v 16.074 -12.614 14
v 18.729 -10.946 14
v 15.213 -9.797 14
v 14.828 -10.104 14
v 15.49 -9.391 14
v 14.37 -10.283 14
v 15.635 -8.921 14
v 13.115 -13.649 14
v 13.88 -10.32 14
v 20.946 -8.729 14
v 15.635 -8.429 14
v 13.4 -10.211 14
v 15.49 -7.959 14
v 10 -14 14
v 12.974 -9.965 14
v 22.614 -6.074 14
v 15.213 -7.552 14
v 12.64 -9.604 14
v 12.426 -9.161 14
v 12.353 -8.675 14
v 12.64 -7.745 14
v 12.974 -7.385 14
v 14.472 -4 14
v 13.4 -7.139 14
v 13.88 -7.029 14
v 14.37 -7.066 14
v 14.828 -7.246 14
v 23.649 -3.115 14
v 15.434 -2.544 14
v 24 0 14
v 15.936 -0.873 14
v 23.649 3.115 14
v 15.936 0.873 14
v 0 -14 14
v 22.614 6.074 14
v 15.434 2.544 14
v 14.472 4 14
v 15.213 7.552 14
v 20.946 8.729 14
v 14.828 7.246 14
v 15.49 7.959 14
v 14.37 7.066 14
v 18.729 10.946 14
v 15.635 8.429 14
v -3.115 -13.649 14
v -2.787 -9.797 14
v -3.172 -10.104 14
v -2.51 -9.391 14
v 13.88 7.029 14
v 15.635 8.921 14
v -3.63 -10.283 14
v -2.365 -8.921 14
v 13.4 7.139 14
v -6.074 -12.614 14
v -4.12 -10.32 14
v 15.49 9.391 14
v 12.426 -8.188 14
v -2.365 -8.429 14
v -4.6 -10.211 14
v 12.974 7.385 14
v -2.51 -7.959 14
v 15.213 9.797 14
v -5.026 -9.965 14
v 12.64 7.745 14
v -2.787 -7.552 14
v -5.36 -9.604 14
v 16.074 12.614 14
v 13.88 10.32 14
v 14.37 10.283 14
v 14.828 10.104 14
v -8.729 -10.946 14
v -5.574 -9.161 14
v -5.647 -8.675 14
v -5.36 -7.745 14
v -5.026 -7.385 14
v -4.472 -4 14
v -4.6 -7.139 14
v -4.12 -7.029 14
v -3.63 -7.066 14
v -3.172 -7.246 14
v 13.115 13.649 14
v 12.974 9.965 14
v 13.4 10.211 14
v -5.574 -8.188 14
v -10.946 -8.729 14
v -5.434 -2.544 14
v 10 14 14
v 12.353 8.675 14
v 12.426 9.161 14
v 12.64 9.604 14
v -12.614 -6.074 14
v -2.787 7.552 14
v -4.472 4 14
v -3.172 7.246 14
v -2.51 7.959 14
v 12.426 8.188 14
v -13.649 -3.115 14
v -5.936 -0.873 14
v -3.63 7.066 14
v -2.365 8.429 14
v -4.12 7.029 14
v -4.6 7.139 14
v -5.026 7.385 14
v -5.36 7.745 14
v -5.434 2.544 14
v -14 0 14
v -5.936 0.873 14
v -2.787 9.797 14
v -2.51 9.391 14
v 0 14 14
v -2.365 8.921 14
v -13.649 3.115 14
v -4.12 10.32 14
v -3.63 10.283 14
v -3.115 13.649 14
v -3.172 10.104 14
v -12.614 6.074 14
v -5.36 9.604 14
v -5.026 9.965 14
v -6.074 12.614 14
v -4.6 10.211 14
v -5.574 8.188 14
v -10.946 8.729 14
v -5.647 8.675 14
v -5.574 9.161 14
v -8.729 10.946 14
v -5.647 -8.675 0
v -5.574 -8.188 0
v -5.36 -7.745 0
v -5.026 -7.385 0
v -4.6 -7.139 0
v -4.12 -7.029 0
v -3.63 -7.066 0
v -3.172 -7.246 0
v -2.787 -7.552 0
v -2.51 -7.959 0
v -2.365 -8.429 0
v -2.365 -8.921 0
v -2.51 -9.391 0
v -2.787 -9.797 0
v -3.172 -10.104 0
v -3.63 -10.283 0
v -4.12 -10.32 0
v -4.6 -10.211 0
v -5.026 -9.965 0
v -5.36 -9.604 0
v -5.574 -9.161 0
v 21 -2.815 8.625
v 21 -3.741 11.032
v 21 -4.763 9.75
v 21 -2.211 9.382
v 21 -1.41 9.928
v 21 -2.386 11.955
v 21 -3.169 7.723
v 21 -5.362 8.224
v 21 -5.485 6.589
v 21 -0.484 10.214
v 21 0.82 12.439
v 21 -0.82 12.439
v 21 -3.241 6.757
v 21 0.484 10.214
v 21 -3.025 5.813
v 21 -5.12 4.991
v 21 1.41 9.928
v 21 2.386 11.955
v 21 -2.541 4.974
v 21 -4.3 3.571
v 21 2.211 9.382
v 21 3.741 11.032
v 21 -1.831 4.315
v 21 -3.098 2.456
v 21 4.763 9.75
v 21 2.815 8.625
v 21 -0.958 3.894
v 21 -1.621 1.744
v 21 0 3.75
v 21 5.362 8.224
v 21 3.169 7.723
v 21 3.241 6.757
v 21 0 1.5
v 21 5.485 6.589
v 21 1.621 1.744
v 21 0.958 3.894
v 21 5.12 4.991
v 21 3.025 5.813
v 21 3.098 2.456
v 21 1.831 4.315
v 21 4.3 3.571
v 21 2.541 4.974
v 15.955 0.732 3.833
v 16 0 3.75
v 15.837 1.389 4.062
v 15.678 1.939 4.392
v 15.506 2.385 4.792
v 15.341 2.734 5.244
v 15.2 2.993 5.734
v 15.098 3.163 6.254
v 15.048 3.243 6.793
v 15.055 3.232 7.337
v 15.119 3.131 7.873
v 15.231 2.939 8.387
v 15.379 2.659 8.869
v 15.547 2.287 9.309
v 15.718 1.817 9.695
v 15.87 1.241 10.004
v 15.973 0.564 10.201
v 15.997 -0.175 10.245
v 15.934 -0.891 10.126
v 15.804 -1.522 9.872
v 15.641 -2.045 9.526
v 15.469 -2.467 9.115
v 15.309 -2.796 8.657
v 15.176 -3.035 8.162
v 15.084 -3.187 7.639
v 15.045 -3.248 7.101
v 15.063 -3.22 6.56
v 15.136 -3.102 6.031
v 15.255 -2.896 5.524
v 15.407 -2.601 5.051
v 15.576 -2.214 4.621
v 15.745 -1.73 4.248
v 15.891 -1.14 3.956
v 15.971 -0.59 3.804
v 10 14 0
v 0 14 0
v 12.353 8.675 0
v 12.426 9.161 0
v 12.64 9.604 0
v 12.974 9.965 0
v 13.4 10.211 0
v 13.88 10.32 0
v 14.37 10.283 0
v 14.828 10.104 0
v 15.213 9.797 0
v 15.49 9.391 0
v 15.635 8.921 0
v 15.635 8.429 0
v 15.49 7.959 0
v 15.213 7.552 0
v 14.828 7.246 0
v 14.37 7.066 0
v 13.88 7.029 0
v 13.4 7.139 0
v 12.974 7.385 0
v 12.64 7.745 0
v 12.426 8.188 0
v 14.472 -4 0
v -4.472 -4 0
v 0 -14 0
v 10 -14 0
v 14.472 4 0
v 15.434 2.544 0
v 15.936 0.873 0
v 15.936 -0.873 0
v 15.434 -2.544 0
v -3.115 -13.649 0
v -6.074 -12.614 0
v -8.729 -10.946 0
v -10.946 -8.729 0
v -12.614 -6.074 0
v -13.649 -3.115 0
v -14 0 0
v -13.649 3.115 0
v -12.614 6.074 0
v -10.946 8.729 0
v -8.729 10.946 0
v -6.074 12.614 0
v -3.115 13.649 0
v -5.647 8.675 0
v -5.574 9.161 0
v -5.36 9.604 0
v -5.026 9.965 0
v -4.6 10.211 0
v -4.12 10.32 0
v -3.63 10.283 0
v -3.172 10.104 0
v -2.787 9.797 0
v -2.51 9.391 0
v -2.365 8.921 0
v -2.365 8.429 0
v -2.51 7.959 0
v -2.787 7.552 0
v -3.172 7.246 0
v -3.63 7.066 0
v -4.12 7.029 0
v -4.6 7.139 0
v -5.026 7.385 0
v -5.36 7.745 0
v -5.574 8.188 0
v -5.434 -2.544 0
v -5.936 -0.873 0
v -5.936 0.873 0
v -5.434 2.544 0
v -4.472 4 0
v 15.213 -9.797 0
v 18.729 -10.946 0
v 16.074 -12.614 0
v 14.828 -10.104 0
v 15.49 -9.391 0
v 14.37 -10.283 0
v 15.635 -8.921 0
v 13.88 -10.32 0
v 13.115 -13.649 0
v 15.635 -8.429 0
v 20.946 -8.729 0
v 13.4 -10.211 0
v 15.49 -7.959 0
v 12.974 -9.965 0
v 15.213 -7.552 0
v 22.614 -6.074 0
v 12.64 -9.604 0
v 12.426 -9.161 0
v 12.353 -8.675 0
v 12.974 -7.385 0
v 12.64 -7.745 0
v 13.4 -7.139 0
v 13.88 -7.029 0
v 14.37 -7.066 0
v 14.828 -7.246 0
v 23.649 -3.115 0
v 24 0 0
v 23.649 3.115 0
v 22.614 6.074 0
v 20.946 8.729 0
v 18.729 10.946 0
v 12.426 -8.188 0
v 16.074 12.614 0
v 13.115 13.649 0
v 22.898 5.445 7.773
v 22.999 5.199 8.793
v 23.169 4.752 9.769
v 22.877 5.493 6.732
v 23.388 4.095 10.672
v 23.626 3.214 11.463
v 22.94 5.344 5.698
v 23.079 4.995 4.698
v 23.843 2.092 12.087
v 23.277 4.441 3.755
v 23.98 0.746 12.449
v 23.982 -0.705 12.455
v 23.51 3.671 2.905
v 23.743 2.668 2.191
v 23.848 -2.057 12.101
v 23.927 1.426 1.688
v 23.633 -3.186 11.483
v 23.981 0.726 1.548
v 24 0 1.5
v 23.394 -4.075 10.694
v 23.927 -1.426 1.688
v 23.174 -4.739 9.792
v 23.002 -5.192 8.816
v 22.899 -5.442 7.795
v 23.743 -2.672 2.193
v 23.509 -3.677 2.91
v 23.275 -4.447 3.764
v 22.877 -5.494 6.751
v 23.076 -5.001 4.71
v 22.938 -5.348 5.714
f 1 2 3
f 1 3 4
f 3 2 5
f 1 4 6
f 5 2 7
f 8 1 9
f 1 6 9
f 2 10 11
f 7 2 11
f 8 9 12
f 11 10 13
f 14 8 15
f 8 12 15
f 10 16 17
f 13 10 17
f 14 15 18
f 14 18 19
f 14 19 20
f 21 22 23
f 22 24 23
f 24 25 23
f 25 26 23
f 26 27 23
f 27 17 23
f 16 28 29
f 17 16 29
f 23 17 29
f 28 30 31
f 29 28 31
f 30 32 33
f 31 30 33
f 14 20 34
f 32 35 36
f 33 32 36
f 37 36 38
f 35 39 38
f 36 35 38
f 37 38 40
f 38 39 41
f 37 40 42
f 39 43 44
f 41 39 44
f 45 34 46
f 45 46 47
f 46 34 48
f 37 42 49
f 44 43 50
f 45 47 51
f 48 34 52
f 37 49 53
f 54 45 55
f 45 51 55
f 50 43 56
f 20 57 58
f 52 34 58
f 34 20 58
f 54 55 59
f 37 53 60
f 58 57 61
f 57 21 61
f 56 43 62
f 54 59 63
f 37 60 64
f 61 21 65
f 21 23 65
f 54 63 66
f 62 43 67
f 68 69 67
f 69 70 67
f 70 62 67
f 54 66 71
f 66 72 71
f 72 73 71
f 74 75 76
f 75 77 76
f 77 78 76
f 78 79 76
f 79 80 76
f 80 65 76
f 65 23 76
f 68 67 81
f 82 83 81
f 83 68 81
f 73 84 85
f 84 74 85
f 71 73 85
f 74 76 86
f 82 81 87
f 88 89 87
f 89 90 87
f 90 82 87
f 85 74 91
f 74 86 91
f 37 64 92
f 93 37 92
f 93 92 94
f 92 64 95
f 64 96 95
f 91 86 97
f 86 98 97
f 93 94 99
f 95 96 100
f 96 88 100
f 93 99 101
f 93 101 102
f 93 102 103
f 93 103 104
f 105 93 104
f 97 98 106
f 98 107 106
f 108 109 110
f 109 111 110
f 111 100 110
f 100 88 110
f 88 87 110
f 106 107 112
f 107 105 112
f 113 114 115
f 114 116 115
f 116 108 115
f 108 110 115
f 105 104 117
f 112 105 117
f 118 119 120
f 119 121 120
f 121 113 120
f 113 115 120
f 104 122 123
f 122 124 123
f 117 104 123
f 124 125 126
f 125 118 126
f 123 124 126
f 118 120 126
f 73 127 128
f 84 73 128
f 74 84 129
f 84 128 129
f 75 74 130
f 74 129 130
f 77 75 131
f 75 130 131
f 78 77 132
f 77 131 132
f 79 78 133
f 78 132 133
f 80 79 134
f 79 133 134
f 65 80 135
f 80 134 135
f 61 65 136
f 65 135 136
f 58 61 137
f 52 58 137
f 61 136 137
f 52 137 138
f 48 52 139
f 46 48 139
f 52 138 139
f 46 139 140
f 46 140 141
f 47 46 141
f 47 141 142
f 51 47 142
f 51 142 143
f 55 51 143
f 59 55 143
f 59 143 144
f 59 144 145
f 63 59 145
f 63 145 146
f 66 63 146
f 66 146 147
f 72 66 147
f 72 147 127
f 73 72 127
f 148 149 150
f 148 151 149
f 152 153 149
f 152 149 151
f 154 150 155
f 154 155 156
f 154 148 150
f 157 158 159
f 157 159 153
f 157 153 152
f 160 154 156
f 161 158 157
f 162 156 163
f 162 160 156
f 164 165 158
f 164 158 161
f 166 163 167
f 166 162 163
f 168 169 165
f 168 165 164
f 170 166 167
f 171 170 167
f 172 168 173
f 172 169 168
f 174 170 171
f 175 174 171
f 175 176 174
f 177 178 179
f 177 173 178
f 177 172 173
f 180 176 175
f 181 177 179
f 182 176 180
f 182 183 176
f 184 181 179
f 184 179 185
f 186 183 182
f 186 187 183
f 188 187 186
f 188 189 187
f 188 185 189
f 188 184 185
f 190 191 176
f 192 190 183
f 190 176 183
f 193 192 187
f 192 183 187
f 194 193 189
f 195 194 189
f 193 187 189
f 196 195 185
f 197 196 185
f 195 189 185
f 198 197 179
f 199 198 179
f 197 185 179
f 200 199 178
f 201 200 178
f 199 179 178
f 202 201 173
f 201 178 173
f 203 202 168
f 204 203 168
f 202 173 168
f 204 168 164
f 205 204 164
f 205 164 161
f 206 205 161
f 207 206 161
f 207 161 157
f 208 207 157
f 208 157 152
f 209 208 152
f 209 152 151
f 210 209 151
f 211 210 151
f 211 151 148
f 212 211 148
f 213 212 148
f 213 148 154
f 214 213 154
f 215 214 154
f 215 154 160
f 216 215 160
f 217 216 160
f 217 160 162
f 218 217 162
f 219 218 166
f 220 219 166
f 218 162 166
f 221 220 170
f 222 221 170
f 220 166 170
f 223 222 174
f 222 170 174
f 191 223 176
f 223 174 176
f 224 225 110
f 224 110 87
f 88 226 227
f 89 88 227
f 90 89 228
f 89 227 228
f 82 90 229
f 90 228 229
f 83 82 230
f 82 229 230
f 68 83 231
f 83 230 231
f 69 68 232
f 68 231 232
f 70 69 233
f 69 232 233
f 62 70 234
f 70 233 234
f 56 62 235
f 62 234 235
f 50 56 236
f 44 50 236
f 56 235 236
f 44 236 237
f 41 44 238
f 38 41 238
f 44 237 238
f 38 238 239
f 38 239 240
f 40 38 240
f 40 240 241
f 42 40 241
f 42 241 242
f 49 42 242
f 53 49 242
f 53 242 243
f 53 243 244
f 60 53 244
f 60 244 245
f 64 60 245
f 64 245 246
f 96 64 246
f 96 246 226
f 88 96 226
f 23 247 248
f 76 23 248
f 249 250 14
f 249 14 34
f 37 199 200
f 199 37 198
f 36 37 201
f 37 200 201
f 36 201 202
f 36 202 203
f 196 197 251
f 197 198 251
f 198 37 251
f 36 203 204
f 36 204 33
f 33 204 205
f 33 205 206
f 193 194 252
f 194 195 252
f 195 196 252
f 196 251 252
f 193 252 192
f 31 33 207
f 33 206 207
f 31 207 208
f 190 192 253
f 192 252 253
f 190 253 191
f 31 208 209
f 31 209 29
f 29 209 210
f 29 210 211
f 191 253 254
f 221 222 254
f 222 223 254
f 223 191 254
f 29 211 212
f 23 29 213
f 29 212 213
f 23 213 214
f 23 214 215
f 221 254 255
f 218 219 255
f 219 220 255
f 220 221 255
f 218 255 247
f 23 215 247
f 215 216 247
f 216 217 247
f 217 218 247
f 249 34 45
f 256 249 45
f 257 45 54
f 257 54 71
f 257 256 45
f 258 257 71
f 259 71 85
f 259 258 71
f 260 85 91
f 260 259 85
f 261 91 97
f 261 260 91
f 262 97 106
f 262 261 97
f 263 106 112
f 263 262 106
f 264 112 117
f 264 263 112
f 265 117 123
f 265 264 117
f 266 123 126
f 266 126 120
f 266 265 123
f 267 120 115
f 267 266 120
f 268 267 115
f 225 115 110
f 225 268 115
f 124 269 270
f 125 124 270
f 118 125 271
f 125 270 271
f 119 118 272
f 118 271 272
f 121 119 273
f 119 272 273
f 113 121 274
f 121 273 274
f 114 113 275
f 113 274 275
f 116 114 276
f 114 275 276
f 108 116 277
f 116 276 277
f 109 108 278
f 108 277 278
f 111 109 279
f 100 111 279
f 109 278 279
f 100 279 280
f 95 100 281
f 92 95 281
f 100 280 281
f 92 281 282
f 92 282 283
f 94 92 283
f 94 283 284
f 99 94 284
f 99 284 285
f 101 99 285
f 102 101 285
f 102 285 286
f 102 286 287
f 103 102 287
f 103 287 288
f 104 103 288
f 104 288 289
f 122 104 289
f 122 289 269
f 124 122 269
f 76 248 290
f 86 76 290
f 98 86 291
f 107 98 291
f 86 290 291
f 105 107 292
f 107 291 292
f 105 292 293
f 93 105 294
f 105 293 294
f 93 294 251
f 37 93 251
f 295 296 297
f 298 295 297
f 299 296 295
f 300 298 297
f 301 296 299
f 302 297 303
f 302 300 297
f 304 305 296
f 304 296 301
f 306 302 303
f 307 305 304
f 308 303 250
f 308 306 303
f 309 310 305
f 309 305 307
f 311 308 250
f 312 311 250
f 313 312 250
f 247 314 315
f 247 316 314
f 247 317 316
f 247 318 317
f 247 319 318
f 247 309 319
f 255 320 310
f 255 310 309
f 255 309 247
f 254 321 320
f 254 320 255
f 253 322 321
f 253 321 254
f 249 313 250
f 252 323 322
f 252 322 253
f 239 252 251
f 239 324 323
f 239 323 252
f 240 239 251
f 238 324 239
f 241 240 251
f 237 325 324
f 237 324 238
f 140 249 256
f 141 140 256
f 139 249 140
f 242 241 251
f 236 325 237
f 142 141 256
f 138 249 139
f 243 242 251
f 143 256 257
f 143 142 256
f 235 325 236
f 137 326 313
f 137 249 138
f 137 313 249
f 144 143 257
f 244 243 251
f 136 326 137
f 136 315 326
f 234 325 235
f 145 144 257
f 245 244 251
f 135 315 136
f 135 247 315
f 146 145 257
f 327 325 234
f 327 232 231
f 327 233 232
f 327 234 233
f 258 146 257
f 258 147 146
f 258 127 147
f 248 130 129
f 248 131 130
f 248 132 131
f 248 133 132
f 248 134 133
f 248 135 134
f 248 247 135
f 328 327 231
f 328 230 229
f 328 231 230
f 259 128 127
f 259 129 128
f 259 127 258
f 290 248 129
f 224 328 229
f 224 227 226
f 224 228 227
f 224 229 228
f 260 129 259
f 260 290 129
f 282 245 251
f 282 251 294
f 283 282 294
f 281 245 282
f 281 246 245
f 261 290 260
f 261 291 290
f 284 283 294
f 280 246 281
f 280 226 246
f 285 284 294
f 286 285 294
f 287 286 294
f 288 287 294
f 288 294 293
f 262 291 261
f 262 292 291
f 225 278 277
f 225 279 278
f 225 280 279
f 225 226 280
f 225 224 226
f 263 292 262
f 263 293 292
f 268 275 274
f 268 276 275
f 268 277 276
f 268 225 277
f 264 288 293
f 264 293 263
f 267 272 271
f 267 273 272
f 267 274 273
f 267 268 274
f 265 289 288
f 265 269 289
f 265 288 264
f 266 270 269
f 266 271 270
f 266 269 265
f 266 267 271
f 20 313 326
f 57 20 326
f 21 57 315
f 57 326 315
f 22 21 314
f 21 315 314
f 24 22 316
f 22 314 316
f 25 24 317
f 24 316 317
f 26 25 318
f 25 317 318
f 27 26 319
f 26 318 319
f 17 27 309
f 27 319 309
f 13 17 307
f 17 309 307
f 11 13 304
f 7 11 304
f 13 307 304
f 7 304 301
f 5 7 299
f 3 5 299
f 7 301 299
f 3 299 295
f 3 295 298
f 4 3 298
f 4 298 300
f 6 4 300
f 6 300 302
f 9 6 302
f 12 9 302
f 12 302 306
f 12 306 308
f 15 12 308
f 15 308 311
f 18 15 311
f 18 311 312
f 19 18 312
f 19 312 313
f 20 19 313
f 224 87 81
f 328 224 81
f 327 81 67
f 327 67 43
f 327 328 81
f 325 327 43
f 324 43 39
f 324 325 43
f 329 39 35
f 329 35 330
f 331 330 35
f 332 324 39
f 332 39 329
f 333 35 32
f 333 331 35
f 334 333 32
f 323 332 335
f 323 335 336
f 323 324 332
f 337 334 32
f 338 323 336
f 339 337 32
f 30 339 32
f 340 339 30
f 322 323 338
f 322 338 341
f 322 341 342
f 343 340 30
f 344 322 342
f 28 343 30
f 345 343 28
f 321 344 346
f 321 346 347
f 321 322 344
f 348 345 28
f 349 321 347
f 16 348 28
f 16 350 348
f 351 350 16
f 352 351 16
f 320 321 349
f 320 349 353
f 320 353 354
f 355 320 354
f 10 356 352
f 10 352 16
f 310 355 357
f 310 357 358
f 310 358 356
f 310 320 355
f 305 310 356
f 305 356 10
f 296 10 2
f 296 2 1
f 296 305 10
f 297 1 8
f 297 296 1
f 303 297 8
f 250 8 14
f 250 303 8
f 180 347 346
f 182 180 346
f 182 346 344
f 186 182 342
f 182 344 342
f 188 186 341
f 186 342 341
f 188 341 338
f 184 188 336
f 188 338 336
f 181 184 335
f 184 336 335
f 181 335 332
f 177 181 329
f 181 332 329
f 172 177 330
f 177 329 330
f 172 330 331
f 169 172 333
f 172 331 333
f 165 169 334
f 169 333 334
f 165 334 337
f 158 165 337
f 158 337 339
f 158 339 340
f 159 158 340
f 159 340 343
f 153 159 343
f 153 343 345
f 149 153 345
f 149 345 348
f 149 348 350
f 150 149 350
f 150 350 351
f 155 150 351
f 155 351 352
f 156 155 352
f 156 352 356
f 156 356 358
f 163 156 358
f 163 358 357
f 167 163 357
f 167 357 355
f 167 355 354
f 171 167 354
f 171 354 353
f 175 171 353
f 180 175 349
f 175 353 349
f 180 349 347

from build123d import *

# Parameters (mm, degrees)
BOSS_EXTRUDE1_DEPTH     = 14
M4_TAPPED_HOLE2_D       = 3.3
CUT_EXTRUDE1_REACH      = 44.849
CUT_EXTRUDE1_END_RADIUS = 6
SKETCH5_R               = 3.25
SKETCH6_R               = 5.5
CUT_EXTRUDE2_DEPTH      = 3


with BuildPart() as part:
    # Sketch1 → Boss-Extrude1 (new body)
    with BuildSketch(Plane.XY):
        with BuildLine():
            Line((0, 14), (10, 14))
            ThreePointArc((10, 14), (24, 0), (10, -14))
            Line((10, -14), (0, -14))
            ThreePointArc((0, -14), (-14, 0), (0, 14))
        make_face()
        with BuildLine():
            Line((-4.472135955, 4), (14.472135955, 4))
            ThreePointArc((14.472135955, 4), (16, 0), (14.472135955, -4))
            Line((14.472135955, -4), (-4.472135955, -4))
            ThreePointArc((-4.472135955, -4), (-6, 0), (-4.472135955, 4))
        make_face(mode=Mode.SUBTRACT)
    extrude(amount=BOSS_EXTRUDE1_DEPTH)

    # M4 Tapped Hole2 (through all)
    with Locations(Plane(origin=(-3.996947905, 8.674675786, 14), x_dir=(1, 0, 0), z_dir=(0, 0, 1))):
        with Locations((0, 0), (18, 0), (18, -17.349351572), (0, -17.349351572)):
            Hole(M4_TAPPED_HOLE2_D / 2)

    # Cut-Extrude1: up to this cylinder (the profile starts outside it)
    cut_extrude1_end = Plane(origin=(10, 0, 7), z_dir=(0, 0, -1)) * Cylinder(CUT_EXTRUDE1_END_RADIUS, 102.698, mode=Mode.PRIVATE)
    # Sketch5 → Cut-Extrude1 (cut, up to the surface)
    with BuildSketch(Plane(origin=(24, 0, 0), x_dir=(0, 0, -1), z_dir=(1, 0, 0)), mode=Mode.PRIVATE) as cut_extrude1_sk1:
        with Locations((-7, 0)):
            Circle(SKETCH5_R)
    cut_extrude1_tool1 = extrude(cut_extrude1_sk1.sketch, amount=-CUT_EXTRUDE1_REACH, mode=Mode.PRIVATE) - cut_extrude1_end
    add(cut_extrude1_tool1.solids().sort_by_distance((24, 0, 7))[0], mode=Mode.SUBTRACT)

    # Sketch6 → Cut-Extrude2 (cut)
    with BuildSketch(Plane(origin=(24, 0, 0), x_dir=(0, 0, -1), z_dir=(1, 0, 0))):
        with Locations((-7, 0)):
            Circle(SKETCH6_R)
    extrude(amount=-CUT_EXTRUDE2_DEPTH, mode=Mode.SUBTRACT)


solid = part.part
